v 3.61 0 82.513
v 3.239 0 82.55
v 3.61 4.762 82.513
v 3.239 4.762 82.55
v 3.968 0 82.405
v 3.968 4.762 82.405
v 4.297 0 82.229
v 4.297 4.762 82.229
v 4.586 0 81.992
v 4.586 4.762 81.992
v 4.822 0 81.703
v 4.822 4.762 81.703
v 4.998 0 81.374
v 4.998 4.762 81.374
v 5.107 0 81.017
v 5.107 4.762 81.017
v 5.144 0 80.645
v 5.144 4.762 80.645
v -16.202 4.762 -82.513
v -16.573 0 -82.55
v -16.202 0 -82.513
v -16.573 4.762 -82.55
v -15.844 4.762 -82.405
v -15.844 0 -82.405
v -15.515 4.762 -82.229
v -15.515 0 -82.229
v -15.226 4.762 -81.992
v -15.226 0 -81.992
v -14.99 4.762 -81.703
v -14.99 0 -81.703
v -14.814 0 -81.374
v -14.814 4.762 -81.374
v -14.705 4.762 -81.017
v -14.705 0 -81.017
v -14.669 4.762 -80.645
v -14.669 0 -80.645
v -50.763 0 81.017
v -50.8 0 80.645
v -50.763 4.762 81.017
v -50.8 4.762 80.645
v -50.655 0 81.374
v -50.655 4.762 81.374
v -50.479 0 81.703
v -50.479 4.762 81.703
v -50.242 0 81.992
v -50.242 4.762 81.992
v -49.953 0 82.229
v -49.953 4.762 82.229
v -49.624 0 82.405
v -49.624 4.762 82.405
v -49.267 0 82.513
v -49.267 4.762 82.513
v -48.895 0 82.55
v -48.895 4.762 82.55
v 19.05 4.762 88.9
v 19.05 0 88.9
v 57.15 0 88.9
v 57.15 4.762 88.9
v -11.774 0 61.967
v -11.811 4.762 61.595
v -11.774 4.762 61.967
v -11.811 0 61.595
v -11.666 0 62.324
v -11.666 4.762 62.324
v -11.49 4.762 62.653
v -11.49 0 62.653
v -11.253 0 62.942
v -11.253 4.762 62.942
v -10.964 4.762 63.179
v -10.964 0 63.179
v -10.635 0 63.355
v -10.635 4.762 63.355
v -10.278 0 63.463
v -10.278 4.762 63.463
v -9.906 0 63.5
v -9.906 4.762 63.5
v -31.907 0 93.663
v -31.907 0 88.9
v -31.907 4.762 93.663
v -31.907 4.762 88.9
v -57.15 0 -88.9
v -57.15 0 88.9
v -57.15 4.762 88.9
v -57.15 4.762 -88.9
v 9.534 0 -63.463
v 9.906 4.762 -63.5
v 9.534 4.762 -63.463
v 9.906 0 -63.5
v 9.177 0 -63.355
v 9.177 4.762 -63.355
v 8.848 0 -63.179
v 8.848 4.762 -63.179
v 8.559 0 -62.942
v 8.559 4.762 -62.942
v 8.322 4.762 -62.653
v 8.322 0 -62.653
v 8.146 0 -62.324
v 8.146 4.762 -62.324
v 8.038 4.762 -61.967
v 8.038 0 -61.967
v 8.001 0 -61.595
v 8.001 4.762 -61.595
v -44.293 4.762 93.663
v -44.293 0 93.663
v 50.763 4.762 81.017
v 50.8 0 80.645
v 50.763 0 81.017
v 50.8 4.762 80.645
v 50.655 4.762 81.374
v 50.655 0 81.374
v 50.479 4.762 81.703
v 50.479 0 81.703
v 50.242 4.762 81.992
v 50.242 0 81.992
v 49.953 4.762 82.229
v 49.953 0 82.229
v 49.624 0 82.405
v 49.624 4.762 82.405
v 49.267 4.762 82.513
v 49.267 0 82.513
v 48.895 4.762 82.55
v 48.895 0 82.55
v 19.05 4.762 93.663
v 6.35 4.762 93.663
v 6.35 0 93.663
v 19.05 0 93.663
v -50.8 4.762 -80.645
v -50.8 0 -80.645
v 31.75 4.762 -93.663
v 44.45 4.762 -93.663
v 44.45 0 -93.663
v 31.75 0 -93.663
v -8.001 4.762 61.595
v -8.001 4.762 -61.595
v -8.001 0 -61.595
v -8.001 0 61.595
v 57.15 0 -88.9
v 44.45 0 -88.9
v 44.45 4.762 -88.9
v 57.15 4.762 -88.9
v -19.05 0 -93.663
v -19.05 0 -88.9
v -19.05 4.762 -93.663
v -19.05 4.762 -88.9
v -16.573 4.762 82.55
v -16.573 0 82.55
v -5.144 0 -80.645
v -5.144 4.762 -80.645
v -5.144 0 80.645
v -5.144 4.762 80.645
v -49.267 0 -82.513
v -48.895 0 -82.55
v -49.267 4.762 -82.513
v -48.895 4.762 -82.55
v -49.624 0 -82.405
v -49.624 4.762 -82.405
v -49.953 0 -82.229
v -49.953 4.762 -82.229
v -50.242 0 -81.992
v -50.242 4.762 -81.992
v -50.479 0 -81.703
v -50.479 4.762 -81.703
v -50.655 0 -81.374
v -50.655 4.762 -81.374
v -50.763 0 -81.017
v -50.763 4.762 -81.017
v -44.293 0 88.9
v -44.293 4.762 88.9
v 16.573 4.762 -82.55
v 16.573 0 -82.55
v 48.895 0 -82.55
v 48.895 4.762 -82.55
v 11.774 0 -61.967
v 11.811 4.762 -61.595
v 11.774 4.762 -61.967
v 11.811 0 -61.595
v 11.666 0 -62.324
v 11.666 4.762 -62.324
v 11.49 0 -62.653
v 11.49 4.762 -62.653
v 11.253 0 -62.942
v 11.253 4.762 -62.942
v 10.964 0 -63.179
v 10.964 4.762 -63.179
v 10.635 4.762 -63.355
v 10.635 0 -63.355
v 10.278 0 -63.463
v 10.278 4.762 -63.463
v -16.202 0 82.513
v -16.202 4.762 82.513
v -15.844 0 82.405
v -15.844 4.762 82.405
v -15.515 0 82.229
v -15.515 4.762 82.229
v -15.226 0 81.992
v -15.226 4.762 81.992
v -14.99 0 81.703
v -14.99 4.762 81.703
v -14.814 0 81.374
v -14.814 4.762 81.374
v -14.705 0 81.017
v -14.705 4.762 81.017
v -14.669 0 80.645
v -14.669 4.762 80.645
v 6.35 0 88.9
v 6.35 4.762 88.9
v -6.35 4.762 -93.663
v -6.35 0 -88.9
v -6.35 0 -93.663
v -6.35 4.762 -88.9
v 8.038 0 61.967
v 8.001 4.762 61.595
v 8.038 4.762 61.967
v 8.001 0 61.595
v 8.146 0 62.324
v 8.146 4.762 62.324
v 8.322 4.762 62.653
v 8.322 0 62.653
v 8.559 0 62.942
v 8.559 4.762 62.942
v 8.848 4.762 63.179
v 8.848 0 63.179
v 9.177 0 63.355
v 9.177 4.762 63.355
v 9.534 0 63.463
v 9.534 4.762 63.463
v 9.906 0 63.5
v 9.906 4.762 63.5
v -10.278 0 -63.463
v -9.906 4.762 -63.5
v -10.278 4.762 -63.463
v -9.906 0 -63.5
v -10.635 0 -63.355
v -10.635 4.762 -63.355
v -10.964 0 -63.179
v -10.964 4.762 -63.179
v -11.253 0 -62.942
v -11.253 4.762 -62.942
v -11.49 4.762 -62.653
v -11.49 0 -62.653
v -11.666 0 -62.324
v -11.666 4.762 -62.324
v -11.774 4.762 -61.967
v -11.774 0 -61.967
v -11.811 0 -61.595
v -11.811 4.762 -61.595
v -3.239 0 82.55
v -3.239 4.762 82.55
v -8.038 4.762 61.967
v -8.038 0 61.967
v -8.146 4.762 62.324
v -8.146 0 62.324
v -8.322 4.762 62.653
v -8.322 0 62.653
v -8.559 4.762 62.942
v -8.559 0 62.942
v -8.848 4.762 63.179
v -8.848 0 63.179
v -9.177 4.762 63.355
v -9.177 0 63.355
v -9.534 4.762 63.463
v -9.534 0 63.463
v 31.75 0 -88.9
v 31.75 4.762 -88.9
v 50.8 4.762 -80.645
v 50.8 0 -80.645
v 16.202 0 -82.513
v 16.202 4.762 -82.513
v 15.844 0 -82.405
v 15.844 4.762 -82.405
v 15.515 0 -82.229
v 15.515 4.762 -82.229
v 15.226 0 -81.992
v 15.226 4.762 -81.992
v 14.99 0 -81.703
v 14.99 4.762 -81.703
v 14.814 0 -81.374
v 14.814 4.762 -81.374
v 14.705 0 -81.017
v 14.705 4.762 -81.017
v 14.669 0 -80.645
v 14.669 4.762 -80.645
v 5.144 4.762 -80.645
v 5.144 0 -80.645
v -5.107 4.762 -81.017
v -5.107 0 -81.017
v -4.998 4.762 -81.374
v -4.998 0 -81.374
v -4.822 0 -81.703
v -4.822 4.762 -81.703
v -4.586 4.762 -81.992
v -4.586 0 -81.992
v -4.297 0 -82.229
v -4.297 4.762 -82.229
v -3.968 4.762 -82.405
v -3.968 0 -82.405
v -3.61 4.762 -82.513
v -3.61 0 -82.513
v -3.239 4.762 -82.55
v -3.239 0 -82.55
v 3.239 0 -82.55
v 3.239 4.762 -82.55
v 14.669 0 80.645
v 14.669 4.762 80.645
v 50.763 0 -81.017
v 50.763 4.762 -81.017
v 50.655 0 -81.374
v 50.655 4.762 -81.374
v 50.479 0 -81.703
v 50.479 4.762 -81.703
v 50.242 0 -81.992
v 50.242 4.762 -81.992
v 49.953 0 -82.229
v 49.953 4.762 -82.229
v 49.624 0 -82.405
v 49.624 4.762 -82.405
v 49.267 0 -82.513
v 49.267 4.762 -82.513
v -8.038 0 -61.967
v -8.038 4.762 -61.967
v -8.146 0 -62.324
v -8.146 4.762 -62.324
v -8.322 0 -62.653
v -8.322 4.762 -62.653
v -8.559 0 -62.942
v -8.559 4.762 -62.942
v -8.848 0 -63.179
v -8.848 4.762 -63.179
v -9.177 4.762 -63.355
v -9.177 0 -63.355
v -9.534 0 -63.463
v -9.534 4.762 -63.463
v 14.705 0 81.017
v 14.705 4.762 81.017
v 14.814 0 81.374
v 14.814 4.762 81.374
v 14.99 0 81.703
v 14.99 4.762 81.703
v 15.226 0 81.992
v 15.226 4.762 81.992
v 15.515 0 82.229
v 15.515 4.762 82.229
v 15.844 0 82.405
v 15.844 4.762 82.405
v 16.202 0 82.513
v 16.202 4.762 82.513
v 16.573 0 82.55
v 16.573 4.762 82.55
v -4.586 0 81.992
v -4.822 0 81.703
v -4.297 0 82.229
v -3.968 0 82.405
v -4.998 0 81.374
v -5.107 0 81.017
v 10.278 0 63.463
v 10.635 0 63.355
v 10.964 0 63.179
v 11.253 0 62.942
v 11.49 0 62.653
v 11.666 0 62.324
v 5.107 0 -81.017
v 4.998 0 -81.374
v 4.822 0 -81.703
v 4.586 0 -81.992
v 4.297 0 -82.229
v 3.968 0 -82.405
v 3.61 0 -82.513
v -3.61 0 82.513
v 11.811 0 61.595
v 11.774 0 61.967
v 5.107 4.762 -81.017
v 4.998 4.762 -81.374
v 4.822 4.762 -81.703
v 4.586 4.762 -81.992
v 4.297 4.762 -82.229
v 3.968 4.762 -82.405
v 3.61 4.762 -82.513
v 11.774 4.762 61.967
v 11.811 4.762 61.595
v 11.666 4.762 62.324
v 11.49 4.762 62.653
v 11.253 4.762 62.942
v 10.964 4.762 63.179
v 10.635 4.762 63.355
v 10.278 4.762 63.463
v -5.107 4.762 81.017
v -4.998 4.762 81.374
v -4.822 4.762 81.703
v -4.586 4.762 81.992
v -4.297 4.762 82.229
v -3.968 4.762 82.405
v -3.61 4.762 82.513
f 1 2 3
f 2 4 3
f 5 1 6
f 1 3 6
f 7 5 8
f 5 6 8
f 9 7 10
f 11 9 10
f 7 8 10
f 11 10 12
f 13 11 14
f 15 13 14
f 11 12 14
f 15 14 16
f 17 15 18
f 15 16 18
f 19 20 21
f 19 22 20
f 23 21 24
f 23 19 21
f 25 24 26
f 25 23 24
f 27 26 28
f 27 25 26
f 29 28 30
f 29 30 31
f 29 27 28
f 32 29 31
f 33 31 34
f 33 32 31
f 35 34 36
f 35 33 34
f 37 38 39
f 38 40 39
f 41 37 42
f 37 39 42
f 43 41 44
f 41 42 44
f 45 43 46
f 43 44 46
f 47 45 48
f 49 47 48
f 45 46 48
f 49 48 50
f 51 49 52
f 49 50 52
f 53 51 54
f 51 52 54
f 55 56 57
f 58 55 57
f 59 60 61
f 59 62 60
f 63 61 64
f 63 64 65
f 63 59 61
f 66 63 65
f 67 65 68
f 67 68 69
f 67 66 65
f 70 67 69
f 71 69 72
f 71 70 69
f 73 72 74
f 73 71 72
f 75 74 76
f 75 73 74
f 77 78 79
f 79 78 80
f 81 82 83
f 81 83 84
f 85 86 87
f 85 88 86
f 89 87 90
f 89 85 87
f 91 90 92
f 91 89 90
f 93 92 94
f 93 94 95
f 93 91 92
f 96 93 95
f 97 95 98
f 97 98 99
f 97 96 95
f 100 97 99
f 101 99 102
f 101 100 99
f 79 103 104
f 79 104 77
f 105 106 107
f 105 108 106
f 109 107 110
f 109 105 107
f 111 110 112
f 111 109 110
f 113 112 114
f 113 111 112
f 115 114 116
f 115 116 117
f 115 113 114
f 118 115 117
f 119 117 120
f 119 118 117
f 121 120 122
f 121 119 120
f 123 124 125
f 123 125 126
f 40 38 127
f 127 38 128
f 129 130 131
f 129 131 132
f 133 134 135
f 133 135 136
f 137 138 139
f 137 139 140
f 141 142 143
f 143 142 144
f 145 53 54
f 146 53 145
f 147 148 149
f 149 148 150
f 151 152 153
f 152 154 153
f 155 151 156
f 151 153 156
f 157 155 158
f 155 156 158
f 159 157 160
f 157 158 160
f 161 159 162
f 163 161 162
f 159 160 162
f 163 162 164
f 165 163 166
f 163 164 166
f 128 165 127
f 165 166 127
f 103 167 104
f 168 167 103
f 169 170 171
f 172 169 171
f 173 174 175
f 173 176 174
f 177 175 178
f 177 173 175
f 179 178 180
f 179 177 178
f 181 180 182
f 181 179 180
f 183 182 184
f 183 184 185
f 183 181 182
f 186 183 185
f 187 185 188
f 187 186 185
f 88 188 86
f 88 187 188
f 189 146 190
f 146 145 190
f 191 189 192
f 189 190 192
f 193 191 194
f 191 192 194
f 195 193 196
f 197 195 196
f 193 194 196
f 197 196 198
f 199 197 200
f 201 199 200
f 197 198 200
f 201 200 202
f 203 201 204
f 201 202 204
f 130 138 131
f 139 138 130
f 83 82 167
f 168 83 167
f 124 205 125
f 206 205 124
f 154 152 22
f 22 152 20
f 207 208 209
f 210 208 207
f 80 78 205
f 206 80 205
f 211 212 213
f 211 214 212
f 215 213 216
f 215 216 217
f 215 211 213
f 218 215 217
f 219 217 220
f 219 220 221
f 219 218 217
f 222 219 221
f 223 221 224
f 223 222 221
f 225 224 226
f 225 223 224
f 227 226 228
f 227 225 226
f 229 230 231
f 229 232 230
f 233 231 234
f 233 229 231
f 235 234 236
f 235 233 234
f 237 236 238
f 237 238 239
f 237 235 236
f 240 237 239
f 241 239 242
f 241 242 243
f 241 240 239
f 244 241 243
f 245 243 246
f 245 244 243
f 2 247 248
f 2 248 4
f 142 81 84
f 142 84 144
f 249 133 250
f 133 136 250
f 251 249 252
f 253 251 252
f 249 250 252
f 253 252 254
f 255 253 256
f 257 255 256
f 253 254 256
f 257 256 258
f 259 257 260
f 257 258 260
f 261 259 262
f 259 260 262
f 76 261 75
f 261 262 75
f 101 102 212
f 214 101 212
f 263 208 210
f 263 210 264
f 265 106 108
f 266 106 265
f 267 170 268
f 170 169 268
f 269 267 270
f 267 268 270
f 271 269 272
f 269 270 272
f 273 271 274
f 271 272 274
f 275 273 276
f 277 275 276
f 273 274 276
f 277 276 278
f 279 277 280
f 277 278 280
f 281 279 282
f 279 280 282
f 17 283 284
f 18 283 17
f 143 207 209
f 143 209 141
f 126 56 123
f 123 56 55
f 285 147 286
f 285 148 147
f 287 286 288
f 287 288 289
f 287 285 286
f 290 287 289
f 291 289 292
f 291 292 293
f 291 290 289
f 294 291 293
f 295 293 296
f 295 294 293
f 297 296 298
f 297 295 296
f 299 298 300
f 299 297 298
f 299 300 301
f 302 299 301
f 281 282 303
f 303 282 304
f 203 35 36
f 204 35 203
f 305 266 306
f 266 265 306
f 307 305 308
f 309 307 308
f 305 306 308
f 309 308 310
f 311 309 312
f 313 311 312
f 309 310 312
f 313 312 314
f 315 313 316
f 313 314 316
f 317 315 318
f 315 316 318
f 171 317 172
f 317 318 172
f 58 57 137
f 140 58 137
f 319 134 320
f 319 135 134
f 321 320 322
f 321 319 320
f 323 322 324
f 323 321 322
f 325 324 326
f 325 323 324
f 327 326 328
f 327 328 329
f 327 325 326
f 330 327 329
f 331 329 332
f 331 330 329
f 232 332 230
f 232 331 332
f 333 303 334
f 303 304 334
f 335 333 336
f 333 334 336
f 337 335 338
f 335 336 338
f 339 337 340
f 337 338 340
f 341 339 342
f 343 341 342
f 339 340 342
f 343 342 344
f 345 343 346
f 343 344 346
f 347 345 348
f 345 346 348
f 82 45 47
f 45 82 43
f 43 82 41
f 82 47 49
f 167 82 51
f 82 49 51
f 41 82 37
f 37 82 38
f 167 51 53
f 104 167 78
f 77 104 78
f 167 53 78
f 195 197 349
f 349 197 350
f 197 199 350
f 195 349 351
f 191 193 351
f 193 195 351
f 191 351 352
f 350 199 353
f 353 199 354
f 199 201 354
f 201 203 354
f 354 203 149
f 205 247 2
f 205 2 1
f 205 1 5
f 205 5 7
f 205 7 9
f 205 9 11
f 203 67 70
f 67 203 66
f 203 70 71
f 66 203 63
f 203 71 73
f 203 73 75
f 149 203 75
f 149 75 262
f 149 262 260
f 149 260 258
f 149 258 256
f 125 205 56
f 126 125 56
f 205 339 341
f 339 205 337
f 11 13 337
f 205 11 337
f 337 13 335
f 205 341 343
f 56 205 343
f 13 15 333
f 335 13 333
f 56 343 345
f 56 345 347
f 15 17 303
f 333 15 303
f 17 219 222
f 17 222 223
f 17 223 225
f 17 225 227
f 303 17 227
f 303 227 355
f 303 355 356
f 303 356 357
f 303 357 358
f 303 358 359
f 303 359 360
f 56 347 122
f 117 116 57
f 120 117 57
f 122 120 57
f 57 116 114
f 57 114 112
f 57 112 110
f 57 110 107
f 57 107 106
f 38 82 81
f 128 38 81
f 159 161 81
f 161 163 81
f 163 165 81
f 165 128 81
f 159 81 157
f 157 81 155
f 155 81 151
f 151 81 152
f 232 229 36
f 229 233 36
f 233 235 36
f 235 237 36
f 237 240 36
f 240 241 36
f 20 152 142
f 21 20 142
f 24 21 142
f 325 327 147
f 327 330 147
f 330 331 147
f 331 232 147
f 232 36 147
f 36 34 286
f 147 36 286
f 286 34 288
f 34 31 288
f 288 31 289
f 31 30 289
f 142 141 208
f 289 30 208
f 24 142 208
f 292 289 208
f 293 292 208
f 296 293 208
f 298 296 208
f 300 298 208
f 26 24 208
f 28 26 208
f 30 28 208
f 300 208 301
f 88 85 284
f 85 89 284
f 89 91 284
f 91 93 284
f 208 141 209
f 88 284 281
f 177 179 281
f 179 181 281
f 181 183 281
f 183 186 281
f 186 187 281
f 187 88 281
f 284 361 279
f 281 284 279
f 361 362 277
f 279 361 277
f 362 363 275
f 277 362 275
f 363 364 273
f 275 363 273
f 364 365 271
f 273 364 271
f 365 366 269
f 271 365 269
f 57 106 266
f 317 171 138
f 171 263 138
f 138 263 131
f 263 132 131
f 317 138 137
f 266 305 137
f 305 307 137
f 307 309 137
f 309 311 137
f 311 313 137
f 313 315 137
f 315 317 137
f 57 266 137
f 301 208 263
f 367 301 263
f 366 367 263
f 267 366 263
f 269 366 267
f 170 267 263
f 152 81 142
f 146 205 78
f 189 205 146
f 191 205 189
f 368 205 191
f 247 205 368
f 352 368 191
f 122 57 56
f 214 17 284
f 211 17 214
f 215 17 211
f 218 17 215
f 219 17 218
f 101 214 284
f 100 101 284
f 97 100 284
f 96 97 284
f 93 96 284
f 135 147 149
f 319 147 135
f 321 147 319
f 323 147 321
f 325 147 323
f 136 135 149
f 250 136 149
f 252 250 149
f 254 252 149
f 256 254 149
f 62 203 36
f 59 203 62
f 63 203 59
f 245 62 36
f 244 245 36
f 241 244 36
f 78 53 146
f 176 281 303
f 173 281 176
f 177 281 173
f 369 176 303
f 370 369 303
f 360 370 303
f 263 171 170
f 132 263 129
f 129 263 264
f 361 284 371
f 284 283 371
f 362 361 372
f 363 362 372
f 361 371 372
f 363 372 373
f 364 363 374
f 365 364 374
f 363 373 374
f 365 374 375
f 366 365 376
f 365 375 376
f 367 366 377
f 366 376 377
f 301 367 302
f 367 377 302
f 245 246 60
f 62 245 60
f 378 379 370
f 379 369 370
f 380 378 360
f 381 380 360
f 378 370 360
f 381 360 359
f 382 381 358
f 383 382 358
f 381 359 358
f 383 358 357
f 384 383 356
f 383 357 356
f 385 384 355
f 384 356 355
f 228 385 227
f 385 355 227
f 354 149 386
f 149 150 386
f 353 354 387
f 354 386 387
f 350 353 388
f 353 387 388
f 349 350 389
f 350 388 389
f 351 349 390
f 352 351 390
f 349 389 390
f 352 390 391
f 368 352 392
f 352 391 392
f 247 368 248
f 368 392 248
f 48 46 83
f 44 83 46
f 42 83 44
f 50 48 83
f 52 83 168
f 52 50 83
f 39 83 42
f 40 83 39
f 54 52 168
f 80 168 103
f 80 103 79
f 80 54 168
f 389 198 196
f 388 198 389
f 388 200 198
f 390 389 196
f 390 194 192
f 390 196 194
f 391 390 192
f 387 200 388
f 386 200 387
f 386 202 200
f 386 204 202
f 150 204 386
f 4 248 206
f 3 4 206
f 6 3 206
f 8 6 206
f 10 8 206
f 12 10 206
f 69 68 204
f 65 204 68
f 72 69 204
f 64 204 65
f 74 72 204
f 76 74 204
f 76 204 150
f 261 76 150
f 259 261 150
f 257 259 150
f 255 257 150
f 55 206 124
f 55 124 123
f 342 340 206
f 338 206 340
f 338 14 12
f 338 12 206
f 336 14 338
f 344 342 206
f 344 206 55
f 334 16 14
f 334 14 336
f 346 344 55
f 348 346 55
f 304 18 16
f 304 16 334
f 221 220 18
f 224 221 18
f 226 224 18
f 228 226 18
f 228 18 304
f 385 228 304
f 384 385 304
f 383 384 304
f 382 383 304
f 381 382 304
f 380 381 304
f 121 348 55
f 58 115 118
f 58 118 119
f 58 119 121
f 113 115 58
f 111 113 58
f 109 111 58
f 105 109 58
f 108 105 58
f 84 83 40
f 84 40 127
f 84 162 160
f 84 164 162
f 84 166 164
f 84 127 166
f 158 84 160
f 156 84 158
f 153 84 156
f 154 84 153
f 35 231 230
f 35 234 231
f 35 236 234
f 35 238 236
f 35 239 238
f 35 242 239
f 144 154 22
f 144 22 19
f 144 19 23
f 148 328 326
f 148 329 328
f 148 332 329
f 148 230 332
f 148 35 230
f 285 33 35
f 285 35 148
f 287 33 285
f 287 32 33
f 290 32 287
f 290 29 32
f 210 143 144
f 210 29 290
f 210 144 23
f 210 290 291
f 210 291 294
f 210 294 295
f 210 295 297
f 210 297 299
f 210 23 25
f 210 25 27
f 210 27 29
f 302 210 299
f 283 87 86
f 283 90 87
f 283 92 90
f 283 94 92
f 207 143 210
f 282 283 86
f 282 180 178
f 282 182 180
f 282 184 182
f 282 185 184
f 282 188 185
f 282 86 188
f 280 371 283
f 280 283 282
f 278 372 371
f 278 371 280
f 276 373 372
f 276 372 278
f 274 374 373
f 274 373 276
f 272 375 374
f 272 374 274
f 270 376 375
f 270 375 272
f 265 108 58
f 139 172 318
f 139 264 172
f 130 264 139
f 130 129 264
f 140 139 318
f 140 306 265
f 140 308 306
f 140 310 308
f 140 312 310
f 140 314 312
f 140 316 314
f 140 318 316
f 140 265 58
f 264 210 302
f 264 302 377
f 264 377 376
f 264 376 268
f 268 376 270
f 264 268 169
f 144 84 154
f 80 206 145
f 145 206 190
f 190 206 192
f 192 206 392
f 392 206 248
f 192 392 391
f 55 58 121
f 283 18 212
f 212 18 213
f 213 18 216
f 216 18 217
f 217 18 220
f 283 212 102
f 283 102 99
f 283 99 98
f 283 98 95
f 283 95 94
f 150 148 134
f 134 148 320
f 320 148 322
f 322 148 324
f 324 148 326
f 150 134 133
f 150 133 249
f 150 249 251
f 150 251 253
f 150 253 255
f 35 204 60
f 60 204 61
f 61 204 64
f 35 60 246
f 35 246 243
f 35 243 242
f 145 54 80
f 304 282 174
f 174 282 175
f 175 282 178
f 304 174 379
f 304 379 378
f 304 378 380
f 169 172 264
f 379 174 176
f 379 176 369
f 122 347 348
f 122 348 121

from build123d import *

# Parameters (mm, degrees)
SKETCH1_W           = 114.3
SKETCH1_H           = 177.8
SKETCH1_W_2         = 101.6
SKETCH1_H_2         = 165.1
BOSS_EXTRUDE1_DEPTH = 4.7625
SKETCH2_W           = 12.38677804
SKETCH2_H           = 4.7625
SKETCH2_W_2         = 12.7
BOSS_EXTRUDE2_DEPTH = 4.7625
SKETCH3_W           = 12.7
SKETCH3_H           = 4.7625
BOSS_EXTRUDE3_DEPTH = 4.7625
SKETCH4_W           = 9.525
SKETCH4_H           = 177.8
SKETCH4_W_2         = 3.81
SKETCH4_H_2         = 127
BOSS_EXTRUDE4_DEPTH = 4.7625
FILLET1_R           = 1.905


with BuildPart() as part:
    # Sketch1 → Boss-Extrude1 (new body)
    with BuildSketch(Plane(origin=(0, 0, 0), x_dir=(1, 0, 0), z_dir=(0, 1, 0))):
        Rectangle(SKETCH1_W, SKETCH1_H)
        Rectangle(SKETCH1_W_2, SKETCH1_H_2, mode=Mode.SUBTRACT)
    extrude(amount=BOSS_EXTRUDE1_DEPTH)

    # Sketch2 → Boss-Extrude2 (add)
    with BuildSketch(Plane.XY.offset(88.9)):
        with Locations((-38.1, 2.38125)):
            Rectangle(SKETCH2_W, SKETCH2_H)
        with Locations((12.7, 2.38125)):
            Rectangle(SKETCH2_W_2, SKETCH2_H)
    extrude(amount=BOSS_EXTRUDE2_DEPTH)

    # Sketch3 → Boss-Extrude3 (add)
    with BuildSketch(Plane(origin=(0, 0, -88.9), x_dir=(-1, 0, 0), z_dir=(0, 0, -1))):
        with Locations((-38.1, 2.38125)):
            Rectangle(SKETCH3_W, SKETCH3_H)
        with Locations((12.7, 2.38125)):
            Rectangle(SKETCH3_W, SKETCH3_H)
    extrude(amount=BOSS_EXTRUDE3_DEPTH)

    # Sketch4 → Boss-Extrude4 (add)
    # profile 1 of 2: a face of its own
    with BuildSketch(Plane(origin=(0, 4.7625, 0), x_dir=(-1, 0, 0), z_dir=(0, 1, 0))):
        with Locations((9.906, 0)):
            Rectangle(SKETCH4_W, SKETCH4_H)
        with Locations((9.906, 0)):
            Rectangle(SKETCH4_W_2, SKETCH4_H_2, mode=Mode.SUBTRACT)
    # profile 2 of 2: a face of its own
    with BuildSketch(Plane(origin=(0, 4.7625, 0), x_dir=(-1, 0, 0), z_dir=(0, 1, 0))):
        with Locations((-9.906, 0)):
            Rectangle(SKETCH4_W, SKETCH4_H)
        with Locations((-9.906, 0)):
            Rectangle(SKETCH4_W_2, SKETCH4_H_2, mode=Mode.SUBTRACT)
    extrude(amount=-BOSS_EXTRUDE4_DEPTH)

    # Fillet1
    fillet1_edges = [part.edges().sort_by_distance(p)[0] for p in [
        (-8.001, 2.38125, -63.5),
        (-11.811, 2.38125, -63.5),
        (8.001, 2.38125, -63.5),
        (11.811, 2.38125, -63.5),
        (-8.001, 2.38125, 63.5),
        (-11.811, 2.38125, 63.5),
        (8.001, 2.38125, 63.5),
        (11.811, 2.38125, 63.5),
        (-5.1435, 2.38125, 82.55),
        (5.1435, 2.38125, 82.55),
        (-5.1435, 2.38125, -82.55),
        (5.1435, 2.38125, -82.55),
        (-14.6685, 2.38125, -82.55),
        (-50.8, 2.38125, -82.55),
        (-50.8, 2.38125, 82.55),
        (-14.6685, 2.38125, 82.55),
        (14.6685, 2.38125, 82.55),
        (50.8, 2.38125, 82.55),
        (14.6685, 2.38125, -82.55),
        (50.8, 2.38125, -82.55),
    ]]
    fillet(fillet1_edges, radius=FILLET1_R - 0.0001)  # a hair under: the kernel refuses the full size


solid = part.part
